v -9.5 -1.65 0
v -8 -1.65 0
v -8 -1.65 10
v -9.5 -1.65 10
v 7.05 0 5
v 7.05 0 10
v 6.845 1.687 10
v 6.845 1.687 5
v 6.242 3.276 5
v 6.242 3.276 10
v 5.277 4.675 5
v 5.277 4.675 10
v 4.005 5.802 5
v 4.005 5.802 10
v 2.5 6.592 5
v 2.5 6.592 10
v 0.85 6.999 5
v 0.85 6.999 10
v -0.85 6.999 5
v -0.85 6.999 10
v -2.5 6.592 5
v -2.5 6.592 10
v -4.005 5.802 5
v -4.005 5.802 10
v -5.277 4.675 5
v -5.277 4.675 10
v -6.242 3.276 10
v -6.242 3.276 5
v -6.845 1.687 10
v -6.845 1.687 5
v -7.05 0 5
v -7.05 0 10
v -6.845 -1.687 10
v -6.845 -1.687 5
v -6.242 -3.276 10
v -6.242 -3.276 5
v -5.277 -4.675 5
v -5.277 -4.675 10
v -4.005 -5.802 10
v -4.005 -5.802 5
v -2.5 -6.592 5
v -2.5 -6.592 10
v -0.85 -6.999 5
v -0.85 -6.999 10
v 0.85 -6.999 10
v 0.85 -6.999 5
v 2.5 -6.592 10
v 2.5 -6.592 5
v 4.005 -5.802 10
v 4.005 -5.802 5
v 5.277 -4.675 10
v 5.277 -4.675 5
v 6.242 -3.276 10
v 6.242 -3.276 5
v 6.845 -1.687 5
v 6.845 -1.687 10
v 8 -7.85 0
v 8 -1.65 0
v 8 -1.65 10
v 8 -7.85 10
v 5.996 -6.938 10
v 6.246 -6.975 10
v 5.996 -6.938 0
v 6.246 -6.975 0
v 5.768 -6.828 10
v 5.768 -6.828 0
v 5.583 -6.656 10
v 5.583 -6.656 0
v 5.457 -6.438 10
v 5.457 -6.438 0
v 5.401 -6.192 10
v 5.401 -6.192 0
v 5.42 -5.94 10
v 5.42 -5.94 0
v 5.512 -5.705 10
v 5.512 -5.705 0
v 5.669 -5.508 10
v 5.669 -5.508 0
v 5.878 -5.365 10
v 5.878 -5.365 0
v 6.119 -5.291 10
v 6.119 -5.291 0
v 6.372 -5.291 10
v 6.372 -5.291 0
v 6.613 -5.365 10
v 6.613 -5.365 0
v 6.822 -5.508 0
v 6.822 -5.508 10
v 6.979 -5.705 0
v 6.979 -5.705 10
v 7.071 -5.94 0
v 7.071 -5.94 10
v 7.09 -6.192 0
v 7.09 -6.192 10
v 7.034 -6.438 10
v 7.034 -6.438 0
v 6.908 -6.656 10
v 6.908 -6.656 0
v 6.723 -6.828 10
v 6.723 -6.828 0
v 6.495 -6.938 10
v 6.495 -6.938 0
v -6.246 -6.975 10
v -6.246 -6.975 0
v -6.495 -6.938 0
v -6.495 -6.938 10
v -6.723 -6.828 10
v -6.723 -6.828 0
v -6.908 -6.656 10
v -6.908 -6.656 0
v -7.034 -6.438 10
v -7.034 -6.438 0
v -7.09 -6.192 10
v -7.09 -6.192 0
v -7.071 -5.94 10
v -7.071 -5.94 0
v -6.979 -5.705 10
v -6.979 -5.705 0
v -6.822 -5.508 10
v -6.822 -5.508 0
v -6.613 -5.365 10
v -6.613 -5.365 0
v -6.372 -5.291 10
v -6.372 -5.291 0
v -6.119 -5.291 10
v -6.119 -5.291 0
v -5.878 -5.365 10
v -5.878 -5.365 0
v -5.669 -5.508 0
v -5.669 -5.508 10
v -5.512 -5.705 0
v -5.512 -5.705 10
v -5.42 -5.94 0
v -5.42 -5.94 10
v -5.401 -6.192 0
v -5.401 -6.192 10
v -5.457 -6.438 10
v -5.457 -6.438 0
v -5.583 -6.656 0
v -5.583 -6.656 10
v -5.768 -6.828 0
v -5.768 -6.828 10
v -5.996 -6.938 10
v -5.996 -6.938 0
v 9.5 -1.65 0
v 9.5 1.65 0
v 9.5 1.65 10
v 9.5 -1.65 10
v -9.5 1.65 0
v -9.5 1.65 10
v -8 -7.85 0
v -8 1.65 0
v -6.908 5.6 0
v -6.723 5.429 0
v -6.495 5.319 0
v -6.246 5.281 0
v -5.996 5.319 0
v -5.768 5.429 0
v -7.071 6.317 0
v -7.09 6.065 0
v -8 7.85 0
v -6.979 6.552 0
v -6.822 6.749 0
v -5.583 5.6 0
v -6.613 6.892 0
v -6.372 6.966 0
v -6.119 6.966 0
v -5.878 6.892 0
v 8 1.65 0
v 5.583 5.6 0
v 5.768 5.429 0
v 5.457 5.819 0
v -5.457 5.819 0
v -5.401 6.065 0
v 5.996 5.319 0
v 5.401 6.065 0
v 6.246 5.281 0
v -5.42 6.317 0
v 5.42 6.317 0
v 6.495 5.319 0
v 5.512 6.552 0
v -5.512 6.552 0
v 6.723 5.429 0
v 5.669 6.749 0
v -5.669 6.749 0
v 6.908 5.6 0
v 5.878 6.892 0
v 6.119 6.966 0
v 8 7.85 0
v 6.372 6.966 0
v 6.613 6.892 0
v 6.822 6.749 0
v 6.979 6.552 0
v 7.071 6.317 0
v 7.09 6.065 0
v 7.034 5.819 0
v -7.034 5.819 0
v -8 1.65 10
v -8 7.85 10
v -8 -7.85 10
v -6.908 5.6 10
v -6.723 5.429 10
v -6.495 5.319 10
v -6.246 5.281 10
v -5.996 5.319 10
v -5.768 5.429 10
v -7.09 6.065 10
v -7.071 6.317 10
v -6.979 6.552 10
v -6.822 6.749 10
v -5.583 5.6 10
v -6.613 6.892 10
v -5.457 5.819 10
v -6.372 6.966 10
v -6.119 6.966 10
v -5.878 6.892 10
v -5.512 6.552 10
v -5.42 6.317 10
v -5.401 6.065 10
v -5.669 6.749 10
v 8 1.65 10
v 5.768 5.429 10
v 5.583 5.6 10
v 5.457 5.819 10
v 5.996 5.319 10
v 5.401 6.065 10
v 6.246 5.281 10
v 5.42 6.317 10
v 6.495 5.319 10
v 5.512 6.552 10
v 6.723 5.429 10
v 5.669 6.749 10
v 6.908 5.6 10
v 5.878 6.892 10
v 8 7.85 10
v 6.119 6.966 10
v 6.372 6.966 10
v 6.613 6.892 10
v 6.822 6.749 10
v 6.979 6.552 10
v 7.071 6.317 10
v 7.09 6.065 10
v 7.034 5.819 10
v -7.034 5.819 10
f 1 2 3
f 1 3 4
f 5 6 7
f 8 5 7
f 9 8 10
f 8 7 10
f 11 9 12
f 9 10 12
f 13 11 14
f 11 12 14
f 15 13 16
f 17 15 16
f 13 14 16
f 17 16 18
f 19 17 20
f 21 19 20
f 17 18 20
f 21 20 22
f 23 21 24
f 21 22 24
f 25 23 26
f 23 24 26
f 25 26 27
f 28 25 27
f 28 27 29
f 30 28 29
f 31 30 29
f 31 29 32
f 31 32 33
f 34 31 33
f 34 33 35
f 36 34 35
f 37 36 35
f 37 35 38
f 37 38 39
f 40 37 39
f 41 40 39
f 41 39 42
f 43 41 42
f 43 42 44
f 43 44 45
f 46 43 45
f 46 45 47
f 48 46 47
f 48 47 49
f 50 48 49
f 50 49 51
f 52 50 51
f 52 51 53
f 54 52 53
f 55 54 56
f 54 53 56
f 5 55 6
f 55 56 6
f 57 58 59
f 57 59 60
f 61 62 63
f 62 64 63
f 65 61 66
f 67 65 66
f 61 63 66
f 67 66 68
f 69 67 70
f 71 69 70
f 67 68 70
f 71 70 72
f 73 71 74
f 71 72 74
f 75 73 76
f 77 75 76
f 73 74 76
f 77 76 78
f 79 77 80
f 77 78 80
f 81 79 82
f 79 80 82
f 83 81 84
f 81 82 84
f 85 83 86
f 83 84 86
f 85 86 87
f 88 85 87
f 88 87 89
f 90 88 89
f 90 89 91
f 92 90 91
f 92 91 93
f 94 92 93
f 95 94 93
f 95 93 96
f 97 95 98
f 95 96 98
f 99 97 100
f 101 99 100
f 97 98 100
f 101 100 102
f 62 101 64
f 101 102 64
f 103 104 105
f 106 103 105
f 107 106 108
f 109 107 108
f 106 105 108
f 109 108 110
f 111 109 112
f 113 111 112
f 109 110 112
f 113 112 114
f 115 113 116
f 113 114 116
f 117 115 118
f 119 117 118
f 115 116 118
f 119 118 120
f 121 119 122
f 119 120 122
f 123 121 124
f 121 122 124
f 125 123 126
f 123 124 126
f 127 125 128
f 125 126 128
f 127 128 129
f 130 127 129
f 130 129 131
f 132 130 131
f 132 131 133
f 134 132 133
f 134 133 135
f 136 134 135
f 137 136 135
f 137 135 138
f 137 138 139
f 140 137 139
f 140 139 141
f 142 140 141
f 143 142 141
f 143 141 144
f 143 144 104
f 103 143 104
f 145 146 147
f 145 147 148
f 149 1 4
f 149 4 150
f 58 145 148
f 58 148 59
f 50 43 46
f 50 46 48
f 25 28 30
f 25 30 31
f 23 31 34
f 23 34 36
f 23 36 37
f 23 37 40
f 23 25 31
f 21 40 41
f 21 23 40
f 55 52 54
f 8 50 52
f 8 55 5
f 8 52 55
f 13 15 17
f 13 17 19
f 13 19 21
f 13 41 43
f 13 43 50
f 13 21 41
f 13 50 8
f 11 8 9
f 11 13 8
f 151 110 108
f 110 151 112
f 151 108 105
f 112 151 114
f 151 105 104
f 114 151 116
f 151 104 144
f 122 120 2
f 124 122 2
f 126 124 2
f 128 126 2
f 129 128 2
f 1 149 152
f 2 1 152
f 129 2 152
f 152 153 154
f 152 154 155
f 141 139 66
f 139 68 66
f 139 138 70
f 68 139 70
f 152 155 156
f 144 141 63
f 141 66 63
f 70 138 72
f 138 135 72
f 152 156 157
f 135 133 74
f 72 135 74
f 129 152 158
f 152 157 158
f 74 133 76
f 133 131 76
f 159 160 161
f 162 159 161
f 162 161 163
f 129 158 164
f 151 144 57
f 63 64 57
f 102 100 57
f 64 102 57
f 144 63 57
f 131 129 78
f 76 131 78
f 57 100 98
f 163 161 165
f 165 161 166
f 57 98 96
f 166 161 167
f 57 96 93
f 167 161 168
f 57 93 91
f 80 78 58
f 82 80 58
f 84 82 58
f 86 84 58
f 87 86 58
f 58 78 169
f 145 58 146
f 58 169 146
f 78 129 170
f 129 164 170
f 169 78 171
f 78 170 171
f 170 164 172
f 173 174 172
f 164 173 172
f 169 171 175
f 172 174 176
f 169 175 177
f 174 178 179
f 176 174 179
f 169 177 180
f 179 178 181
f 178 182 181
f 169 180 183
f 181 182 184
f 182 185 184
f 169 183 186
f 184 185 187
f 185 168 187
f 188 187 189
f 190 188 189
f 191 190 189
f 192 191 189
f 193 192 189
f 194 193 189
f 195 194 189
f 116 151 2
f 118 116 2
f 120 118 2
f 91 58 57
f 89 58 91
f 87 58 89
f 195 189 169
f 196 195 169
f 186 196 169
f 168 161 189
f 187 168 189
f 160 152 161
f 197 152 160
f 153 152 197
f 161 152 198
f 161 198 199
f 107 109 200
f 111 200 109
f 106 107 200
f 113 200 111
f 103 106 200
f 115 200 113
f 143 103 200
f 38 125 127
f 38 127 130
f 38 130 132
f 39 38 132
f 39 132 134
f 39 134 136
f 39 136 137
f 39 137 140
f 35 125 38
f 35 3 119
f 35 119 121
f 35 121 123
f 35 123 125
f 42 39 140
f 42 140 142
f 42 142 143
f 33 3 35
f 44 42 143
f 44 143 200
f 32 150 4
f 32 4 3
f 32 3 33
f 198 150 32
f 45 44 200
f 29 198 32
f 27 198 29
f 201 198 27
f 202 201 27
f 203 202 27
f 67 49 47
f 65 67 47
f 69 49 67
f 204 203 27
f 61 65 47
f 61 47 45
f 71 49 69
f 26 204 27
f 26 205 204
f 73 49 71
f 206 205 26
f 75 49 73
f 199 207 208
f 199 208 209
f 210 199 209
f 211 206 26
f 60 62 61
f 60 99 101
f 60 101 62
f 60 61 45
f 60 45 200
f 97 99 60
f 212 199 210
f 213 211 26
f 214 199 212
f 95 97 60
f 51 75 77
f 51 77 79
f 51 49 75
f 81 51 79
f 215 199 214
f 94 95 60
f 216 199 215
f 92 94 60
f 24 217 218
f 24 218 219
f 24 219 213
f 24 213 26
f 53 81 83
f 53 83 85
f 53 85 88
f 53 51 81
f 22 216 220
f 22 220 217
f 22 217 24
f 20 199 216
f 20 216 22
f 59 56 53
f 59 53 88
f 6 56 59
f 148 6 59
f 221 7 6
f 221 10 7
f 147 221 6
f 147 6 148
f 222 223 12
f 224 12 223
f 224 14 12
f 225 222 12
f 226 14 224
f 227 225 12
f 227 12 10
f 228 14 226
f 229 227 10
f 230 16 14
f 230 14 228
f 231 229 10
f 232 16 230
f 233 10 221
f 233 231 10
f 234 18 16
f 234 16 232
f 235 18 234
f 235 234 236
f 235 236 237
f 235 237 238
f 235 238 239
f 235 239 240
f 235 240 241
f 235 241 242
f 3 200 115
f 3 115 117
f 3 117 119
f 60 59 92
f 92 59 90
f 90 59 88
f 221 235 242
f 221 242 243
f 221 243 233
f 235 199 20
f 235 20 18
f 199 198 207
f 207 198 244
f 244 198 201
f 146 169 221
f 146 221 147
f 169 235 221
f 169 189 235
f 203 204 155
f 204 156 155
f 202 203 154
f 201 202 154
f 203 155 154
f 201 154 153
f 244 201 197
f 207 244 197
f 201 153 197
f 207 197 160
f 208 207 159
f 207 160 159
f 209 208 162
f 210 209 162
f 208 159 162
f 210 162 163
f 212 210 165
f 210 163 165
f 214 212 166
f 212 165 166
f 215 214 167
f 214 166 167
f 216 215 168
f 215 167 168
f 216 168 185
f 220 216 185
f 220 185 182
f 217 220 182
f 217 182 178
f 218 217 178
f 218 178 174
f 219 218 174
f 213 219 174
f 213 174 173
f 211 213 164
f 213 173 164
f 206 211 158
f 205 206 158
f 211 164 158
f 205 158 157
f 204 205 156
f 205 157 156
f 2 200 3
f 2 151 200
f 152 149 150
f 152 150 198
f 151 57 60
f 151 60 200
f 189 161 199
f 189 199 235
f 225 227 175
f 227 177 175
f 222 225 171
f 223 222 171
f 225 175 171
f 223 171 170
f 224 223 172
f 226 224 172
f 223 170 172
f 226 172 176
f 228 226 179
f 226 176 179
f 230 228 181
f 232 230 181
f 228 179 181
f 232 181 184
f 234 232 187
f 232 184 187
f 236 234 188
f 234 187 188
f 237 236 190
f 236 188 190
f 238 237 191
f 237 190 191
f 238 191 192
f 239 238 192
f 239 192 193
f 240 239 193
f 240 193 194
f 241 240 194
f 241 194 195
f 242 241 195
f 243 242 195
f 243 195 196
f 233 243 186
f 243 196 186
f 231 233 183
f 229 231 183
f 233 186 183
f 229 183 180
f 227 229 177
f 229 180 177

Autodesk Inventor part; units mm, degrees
ref_plane "YZ Plane" through (0, 0, 0) normal (1, 0, 0) x (0, 1, 0)
ref_plane "XZ Plane" through (0, 0, 0) normal (0, 1, 0) x (-1, 0, 0)
ref_plane "XY Plane" through (0, 0, 0) normal (0, 0, 1) x (1, 0, 0)
sketch "Sketch1" plane through (0, 0, 0) normal (0, 0, 1) x (1, 0, 0)
  line L0 (8, -7.85) -> (-8, -7.85)
  line L1 (-8, 7.85) -> (8, 7.85)
  line L2 (8, -7.85) -> (-8, 7.85) construction
  line L3 (-9.5, -1.65) -> (-9.5, 1.65)
  line L4 (9.5, 1.65) -> (9.5, -1.65)
  line L5 (-8, -7.85) -> (-8, -1.65)
  line L6 (-8, 1.65) -> (-8, 7.85)
  line L7 (8, 7.85) -> (8, 1.65)
  line L8 (8, -1.65) -> (8, -7.85)
  line L9 (9.5, -1.65) -> (8, -1.65)
  line L10 (-8, -1.65) -> (-9.5, -1.65)
  line L11 (-9.5, 1.65) -> (-8, 1.65)
  line L12 (8, 1.65) -> (9.5, 1.65)
  point P0 (0, 0)
  dimension "d0" = 16
  dimension "d1" = 15.7
  dimension "d2" = 19
  dimension "d3" = 3.3
extrude "Extrusion1" add sketch "Sketch1" along normal blind 10
sketch "Sketch2" plane through (0, 0, 10) normal (0, 0, 1) x (1, 0, 0)
  circle A0 centre (0, 0) radius 7.05
  dimension "d6" = 14.1
extrude "Extrusion2" cut sketch "Sketch2" against normal blind 5
sketch "Sketch4" plane through (0, 0, 10) normal (0, 0, 1) x (1, 0, 0)
  circle A0 centre (0, 0) radius 8.75
  line L0 (-8, 1.65) -> (-8, 7.85) projected
  line L1 (0, 0) -> (-8, 7.85)
  line L2 (-8, -1.65) -> (-8, -7.85) projected
  line L3 (0, 0) -> (-8, -7.85)
  line L4 (-8, -7.85) -> (8, -7.85) projected
  line L5 (0, 0) -> (8, -7.85)
  line L6 (8, 7.85) -> (-8, 7.85) projected
  line L7 (0, 0) -> (8, 7.85)
  point P0 (-6.2455, 6.1284)
  point P1 (6.2455, 6.1284)
  point P2 (6.2455, -6.1284)
  point P3 (-6.2455, -6.1284)
  dimension "d17" = 17.5
hole "Hole2" at (-6.2455, 6.1284, 10) at (6.2455, 6.1284, 10) at (6.2455, -6.1284, 10) at (-6.2455, -6.1284, 10) direction (0, 0, -1) diameter 1.694 end through all thread size "2-56 UNC" class "2B" standard "ANSI Unified Screw Threads"
properties part number "teflonlense assem"
